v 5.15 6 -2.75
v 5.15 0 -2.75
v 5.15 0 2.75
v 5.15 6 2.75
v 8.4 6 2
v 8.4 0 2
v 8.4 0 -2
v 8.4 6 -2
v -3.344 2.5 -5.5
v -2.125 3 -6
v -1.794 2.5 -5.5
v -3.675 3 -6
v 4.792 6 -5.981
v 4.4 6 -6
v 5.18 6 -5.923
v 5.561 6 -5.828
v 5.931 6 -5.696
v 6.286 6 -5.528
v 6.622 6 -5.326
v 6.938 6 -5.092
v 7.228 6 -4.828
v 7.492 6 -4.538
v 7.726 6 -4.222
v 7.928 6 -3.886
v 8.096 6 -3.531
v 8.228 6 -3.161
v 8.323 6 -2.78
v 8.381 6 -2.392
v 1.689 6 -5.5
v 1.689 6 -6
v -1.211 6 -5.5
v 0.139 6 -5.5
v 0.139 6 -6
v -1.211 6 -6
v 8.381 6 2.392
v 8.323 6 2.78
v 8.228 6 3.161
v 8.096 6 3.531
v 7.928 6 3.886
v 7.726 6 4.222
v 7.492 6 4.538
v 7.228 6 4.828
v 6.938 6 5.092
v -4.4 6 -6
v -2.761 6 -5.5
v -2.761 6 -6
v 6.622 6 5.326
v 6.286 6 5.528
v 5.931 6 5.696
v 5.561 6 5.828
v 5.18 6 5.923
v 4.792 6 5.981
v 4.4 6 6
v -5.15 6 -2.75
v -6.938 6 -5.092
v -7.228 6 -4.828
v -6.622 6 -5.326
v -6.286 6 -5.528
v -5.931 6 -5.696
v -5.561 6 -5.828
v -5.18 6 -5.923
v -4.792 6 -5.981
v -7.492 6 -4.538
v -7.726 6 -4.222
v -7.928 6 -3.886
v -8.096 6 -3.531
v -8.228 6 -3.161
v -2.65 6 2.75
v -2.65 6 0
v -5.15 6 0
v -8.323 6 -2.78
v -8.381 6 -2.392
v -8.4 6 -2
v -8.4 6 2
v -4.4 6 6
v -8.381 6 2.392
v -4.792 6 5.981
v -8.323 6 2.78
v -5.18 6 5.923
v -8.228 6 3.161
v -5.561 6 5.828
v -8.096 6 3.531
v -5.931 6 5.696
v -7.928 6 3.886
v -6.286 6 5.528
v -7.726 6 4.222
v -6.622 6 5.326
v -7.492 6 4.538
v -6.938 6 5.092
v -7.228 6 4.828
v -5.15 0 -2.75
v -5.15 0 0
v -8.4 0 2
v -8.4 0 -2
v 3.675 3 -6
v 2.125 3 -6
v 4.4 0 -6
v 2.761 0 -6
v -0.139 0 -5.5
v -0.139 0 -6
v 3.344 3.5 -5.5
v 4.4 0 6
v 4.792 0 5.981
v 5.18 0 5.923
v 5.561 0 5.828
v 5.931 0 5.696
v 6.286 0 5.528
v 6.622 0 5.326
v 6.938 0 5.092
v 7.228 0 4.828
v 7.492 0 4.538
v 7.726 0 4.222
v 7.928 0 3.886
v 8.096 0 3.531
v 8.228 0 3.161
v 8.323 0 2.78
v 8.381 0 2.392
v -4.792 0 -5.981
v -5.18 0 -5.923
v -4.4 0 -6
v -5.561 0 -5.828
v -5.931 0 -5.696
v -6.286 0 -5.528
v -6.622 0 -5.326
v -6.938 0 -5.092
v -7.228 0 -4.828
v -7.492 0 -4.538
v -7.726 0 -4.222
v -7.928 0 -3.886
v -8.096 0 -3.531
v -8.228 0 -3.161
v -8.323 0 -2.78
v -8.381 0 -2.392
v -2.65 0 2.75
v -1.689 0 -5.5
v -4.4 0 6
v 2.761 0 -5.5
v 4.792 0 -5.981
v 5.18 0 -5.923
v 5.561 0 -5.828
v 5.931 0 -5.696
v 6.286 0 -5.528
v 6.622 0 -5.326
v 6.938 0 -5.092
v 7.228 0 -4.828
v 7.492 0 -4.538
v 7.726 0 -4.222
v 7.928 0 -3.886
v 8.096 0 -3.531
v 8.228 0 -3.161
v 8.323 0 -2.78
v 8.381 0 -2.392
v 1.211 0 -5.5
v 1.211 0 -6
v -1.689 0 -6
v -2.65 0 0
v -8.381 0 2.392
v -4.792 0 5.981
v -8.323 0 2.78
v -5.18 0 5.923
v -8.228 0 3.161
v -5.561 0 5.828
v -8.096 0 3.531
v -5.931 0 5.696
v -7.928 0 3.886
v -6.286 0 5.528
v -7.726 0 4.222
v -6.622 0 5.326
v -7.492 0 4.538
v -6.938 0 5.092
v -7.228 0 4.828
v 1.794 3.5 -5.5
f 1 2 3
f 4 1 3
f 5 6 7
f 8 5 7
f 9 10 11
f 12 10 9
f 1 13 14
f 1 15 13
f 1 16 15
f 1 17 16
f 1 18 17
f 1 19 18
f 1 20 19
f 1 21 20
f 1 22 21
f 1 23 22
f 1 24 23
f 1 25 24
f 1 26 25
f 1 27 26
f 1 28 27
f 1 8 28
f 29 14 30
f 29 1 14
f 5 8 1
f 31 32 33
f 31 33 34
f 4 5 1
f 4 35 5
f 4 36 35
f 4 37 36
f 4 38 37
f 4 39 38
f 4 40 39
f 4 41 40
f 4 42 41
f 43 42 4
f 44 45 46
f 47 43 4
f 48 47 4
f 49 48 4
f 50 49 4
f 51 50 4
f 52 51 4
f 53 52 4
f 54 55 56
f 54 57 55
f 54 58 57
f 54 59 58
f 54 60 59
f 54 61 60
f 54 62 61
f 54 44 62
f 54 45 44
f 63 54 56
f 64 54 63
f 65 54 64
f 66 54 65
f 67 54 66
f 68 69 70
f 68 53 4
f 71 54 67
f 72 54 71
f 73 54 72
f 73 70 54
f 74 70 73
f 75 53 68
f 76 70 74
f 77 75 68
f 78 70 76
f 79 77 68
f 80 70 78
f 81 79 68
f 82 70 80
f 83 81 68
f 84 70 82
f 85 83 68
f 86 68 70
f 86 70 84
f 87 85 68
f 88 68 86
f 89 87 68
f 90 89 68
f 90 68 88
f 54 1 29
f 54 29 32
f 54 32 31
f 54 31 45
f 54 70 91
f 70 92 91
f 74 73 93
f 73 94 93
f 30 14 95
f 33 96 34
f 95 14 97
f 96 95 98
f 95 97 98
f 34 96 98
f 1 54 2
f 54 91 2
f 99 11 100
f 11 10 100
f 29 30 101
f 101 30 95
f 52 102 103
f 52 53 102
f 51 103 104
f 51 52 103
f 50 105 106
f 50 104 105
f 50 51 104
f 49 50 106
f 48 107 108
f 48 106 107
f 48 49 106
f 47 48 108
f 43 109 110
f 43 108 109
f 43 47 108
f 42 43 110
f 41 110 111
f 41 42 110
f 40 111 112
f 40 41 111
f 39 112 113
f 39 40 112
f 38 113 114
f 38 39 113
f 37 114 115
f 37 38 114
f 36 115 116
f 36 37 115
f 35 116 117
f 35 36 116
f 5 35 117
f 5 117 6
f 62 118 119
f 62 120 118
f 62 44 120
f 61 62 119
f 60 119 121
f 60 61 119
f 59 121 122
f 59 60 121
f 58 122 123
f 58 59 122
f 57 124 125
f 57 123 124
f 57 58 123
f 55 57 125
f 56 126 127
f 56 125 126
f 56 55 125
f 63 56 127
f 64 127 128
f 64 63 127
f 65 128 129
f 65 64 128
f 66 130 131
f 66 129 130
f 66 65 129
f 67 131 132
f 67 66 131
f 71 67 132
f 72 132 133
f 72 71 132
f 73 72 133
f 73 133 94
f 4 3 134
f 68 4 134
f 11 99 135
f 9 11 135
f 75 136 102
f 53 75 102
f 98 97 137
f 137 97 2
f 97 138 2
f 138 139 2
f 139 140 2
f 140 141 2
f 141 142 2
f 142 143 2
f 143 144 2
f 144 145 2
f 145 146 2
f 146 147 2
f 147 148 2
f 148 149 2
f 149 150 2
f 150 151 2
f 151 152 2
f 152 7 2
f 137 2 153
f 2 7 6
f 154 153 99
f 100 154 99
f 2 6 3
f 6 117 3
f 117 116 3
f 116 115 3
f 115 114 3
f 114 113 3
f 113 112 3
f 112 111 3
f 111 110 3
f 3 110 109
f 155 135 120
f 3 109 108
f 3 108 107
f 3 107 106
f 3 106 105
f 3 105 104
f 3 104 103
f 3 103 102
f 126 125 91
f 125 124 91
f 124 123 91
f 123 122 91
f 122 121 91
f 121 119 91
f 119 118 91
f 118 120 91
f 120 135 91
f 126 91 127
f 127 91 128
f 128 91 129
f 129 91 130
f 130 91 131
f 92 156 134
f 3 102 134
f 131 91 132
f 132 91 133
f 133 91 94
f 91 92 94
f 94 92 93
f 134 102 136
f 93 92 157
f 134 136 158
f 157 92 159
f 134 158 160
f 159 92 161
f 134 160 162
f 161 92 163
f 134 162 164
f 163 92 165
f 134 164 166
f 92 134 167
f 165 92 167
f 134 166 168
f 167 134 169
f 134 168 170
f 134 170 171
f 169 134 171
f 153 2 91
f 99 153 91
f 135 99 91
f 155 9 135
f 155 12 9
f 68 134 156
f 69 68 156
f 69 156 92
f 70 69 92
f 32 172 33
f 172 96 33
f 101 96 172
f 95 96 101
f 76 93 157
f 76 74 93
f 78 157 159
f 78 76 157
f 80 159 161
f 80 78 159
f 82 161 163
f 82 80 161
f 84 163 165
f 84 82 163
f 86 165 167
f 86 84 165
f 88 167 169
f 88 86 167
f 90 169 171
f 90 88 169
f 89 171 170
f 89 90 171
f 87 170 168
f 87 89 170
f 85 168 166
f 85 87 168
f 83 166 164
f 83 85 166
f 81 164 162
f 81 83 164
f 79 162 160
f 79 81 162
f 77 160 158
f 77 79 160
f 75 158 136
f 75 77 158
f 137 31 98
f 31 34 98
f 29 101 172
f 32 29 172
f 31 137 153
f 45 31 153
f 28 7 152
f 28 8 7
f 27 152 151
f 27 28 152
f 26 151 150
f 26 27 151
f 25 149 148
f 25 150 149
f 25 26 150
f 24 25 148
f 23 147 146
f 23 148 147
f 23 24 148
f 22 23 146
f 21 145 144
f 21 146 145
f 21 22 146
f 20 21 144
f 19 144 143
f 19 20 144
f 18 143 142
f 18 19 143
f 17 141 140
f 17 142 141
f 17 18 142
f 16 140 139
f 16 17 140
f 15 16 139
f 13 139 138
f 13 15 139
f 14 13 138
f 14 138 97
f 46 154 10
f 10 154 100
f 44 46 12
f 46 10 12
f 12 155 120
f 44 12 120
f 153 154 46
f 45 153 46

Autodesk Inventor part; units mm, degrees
ref_plane "YZ Plane" through (0, 0, 0) normal (1, 0, 0) x (0, 1, 0)
ref_plane "XZ Plane" through (0, 0, 0) normal (0, 1, 0) x (-1, 0, 0)
ref_plane "XY Plane" through (0, 0, 0) normal (0, 0, 1) x (1, 0, 0)
sketch "Skizze1" plane through (0, 0, 0) normal (0, 1, 0) x (-1, 0, 0)
  line L0 (-5.15, 2.75) -> (2.65, 2.75)
  line L1 (2.65, 2.75) -> (2.65, 0)
  line L2 (2.65, 0) -> (5.15, 0)
  line L3 (5.15, 0) -> (5.15, -2.75)
  line L4 (5.15, -2.75) -> (-5.15, -2.75)
  line L5 (-5.15, -2.75) -> (-5.15, 2.75)
  line L6 (8.4, 6) -> (-8.4, 6)
  line L7 (-8.4, 6) -> (-8.4, -6)
  line L8 (-8.4, -6) -> (8.4, -6)
  line L9 (8.4, -6) -> (8.4, 6)
  line L10 (8.4, 6) -> (-8.4, -6) construction
  line L11 (-8.4, 6) -> (8.4, -6) construction
  point P0 (0, 0)
  point P1 (0, 0)
  dimension "d0" = 16.8
  dimension "d1" = 12
  dimension "d2" = 5.5
  dimension "d3" = 10.3
  dimension "d4" = 2.75
  dimension "d5" = 7.8
  dimension "d6" = 2.75
  dimension "d7" = 3.25
  dimension "d8" = 3.25
extrude "Extrusion1" add sketch "Skizze1" along normal blind 6
fillet "Rundung1" radius 4 4 edges at (8.4, 3, -6) (8.4, 3, 6) (-8.4, 3, -6) (-8.4, 3, 6)
sketch "Skizze3" plane through (4.4, 0, -6) normal (0, 0, -1) x (-1, 0, 0)
  line L0 (8.075, 3) -> (6.525, 3)
  line L1 (6.525, 3) -> (4.3724, -0.2522)
  line L2 (8.075, 3) -> (5.9224, -0.2522)
  line L3 (8.075, 3) -> (11.975, 3) construction
  line L4 (5.9224, -0.2522) -> (4.3724, -0.2522)
  line L5 (3.0224, -0.2522) -> (7.3276, 6.2522)
  line L6 (3.0224, -0.2522) -> (10.8224, -0.2522) construction
  line L7 (7.3276, 6.2522) -> (5.7776, 6.2522)
  line L8 (7.3276, 6.2522) -> (8.8776, 6.2522) construction
  line L9 (5.7776, 6.2522) -> (1.4724, -0.2522)
  line L10 (1.4724, -0.2522) -> (3.0224, -0.2522)
  line L11 (4.4276, 6.2522) -> (2.8776, 6.2522)
  line L12 (2.8776, 6.2522) -> (0.725, 3)
  line L13 (0.725, 3) -> (2.275, 3)
  line L14 (0.725, 3) -> (2.275, 3) construction
  line L15 (2.275, 3) -> (4.4276, 6.2522)
  line L16 (-4, 6) -> (-4, 0) projected
  line L17 (12.8, 0) -> (12.8, 6) projected
  line L18 (0, 6) -> (8.8, 6) projected
  line L19 (0, 0) -> (8.8, 0) projected
  point P0 (4.4, 0)
  point P1 (0, 9.9522)
  dimension "d21" = 3.9
  dimension "d22" = 123.5
  dimension "d23" = 3.9
  dimension "d24" = 123.5
  dimension "d25" = 7.8
  dimension "d26" = 56.5
  dimension "d27" = 1.55
  dimension "d28" = 1.55
  dimension "d29" = 1.55
  dimension "d30" = 180
  dimension "d31" = 123.5
  dimension "d32" = 1.55
  dimension "d33" = 3.9
  dimension "d34" = 123.5
  dimension "d35" = 1.55
  dimension "d36" = 0
  dimension "d37" = 1.35
  dimension "d38" = 1.35
  dimension "d39" = 7.35
  dimension "d42" = 3.7
  dimension "d43" = 0
  dimension "d50" = 4.725
  dimension "d51" = 4.725
  dimension "d52" = -0.2521
  dimension "d53" = 0.2521
extrude "Extrusion3" cut sketch "Skizze3" against normal blind 0.5
chamfer "Fase2" distance 0.5 angle 45 2 edges at (-2.9, 3, -5.5) (2.9, 3, -5.5)
equation "\"d0\" = d3 + 2 * d7"
equation "\"d7\" = d8"
equation "\"d37\" = d38"
equation "\"d50\" = d51"
properties part number "Piholder"
